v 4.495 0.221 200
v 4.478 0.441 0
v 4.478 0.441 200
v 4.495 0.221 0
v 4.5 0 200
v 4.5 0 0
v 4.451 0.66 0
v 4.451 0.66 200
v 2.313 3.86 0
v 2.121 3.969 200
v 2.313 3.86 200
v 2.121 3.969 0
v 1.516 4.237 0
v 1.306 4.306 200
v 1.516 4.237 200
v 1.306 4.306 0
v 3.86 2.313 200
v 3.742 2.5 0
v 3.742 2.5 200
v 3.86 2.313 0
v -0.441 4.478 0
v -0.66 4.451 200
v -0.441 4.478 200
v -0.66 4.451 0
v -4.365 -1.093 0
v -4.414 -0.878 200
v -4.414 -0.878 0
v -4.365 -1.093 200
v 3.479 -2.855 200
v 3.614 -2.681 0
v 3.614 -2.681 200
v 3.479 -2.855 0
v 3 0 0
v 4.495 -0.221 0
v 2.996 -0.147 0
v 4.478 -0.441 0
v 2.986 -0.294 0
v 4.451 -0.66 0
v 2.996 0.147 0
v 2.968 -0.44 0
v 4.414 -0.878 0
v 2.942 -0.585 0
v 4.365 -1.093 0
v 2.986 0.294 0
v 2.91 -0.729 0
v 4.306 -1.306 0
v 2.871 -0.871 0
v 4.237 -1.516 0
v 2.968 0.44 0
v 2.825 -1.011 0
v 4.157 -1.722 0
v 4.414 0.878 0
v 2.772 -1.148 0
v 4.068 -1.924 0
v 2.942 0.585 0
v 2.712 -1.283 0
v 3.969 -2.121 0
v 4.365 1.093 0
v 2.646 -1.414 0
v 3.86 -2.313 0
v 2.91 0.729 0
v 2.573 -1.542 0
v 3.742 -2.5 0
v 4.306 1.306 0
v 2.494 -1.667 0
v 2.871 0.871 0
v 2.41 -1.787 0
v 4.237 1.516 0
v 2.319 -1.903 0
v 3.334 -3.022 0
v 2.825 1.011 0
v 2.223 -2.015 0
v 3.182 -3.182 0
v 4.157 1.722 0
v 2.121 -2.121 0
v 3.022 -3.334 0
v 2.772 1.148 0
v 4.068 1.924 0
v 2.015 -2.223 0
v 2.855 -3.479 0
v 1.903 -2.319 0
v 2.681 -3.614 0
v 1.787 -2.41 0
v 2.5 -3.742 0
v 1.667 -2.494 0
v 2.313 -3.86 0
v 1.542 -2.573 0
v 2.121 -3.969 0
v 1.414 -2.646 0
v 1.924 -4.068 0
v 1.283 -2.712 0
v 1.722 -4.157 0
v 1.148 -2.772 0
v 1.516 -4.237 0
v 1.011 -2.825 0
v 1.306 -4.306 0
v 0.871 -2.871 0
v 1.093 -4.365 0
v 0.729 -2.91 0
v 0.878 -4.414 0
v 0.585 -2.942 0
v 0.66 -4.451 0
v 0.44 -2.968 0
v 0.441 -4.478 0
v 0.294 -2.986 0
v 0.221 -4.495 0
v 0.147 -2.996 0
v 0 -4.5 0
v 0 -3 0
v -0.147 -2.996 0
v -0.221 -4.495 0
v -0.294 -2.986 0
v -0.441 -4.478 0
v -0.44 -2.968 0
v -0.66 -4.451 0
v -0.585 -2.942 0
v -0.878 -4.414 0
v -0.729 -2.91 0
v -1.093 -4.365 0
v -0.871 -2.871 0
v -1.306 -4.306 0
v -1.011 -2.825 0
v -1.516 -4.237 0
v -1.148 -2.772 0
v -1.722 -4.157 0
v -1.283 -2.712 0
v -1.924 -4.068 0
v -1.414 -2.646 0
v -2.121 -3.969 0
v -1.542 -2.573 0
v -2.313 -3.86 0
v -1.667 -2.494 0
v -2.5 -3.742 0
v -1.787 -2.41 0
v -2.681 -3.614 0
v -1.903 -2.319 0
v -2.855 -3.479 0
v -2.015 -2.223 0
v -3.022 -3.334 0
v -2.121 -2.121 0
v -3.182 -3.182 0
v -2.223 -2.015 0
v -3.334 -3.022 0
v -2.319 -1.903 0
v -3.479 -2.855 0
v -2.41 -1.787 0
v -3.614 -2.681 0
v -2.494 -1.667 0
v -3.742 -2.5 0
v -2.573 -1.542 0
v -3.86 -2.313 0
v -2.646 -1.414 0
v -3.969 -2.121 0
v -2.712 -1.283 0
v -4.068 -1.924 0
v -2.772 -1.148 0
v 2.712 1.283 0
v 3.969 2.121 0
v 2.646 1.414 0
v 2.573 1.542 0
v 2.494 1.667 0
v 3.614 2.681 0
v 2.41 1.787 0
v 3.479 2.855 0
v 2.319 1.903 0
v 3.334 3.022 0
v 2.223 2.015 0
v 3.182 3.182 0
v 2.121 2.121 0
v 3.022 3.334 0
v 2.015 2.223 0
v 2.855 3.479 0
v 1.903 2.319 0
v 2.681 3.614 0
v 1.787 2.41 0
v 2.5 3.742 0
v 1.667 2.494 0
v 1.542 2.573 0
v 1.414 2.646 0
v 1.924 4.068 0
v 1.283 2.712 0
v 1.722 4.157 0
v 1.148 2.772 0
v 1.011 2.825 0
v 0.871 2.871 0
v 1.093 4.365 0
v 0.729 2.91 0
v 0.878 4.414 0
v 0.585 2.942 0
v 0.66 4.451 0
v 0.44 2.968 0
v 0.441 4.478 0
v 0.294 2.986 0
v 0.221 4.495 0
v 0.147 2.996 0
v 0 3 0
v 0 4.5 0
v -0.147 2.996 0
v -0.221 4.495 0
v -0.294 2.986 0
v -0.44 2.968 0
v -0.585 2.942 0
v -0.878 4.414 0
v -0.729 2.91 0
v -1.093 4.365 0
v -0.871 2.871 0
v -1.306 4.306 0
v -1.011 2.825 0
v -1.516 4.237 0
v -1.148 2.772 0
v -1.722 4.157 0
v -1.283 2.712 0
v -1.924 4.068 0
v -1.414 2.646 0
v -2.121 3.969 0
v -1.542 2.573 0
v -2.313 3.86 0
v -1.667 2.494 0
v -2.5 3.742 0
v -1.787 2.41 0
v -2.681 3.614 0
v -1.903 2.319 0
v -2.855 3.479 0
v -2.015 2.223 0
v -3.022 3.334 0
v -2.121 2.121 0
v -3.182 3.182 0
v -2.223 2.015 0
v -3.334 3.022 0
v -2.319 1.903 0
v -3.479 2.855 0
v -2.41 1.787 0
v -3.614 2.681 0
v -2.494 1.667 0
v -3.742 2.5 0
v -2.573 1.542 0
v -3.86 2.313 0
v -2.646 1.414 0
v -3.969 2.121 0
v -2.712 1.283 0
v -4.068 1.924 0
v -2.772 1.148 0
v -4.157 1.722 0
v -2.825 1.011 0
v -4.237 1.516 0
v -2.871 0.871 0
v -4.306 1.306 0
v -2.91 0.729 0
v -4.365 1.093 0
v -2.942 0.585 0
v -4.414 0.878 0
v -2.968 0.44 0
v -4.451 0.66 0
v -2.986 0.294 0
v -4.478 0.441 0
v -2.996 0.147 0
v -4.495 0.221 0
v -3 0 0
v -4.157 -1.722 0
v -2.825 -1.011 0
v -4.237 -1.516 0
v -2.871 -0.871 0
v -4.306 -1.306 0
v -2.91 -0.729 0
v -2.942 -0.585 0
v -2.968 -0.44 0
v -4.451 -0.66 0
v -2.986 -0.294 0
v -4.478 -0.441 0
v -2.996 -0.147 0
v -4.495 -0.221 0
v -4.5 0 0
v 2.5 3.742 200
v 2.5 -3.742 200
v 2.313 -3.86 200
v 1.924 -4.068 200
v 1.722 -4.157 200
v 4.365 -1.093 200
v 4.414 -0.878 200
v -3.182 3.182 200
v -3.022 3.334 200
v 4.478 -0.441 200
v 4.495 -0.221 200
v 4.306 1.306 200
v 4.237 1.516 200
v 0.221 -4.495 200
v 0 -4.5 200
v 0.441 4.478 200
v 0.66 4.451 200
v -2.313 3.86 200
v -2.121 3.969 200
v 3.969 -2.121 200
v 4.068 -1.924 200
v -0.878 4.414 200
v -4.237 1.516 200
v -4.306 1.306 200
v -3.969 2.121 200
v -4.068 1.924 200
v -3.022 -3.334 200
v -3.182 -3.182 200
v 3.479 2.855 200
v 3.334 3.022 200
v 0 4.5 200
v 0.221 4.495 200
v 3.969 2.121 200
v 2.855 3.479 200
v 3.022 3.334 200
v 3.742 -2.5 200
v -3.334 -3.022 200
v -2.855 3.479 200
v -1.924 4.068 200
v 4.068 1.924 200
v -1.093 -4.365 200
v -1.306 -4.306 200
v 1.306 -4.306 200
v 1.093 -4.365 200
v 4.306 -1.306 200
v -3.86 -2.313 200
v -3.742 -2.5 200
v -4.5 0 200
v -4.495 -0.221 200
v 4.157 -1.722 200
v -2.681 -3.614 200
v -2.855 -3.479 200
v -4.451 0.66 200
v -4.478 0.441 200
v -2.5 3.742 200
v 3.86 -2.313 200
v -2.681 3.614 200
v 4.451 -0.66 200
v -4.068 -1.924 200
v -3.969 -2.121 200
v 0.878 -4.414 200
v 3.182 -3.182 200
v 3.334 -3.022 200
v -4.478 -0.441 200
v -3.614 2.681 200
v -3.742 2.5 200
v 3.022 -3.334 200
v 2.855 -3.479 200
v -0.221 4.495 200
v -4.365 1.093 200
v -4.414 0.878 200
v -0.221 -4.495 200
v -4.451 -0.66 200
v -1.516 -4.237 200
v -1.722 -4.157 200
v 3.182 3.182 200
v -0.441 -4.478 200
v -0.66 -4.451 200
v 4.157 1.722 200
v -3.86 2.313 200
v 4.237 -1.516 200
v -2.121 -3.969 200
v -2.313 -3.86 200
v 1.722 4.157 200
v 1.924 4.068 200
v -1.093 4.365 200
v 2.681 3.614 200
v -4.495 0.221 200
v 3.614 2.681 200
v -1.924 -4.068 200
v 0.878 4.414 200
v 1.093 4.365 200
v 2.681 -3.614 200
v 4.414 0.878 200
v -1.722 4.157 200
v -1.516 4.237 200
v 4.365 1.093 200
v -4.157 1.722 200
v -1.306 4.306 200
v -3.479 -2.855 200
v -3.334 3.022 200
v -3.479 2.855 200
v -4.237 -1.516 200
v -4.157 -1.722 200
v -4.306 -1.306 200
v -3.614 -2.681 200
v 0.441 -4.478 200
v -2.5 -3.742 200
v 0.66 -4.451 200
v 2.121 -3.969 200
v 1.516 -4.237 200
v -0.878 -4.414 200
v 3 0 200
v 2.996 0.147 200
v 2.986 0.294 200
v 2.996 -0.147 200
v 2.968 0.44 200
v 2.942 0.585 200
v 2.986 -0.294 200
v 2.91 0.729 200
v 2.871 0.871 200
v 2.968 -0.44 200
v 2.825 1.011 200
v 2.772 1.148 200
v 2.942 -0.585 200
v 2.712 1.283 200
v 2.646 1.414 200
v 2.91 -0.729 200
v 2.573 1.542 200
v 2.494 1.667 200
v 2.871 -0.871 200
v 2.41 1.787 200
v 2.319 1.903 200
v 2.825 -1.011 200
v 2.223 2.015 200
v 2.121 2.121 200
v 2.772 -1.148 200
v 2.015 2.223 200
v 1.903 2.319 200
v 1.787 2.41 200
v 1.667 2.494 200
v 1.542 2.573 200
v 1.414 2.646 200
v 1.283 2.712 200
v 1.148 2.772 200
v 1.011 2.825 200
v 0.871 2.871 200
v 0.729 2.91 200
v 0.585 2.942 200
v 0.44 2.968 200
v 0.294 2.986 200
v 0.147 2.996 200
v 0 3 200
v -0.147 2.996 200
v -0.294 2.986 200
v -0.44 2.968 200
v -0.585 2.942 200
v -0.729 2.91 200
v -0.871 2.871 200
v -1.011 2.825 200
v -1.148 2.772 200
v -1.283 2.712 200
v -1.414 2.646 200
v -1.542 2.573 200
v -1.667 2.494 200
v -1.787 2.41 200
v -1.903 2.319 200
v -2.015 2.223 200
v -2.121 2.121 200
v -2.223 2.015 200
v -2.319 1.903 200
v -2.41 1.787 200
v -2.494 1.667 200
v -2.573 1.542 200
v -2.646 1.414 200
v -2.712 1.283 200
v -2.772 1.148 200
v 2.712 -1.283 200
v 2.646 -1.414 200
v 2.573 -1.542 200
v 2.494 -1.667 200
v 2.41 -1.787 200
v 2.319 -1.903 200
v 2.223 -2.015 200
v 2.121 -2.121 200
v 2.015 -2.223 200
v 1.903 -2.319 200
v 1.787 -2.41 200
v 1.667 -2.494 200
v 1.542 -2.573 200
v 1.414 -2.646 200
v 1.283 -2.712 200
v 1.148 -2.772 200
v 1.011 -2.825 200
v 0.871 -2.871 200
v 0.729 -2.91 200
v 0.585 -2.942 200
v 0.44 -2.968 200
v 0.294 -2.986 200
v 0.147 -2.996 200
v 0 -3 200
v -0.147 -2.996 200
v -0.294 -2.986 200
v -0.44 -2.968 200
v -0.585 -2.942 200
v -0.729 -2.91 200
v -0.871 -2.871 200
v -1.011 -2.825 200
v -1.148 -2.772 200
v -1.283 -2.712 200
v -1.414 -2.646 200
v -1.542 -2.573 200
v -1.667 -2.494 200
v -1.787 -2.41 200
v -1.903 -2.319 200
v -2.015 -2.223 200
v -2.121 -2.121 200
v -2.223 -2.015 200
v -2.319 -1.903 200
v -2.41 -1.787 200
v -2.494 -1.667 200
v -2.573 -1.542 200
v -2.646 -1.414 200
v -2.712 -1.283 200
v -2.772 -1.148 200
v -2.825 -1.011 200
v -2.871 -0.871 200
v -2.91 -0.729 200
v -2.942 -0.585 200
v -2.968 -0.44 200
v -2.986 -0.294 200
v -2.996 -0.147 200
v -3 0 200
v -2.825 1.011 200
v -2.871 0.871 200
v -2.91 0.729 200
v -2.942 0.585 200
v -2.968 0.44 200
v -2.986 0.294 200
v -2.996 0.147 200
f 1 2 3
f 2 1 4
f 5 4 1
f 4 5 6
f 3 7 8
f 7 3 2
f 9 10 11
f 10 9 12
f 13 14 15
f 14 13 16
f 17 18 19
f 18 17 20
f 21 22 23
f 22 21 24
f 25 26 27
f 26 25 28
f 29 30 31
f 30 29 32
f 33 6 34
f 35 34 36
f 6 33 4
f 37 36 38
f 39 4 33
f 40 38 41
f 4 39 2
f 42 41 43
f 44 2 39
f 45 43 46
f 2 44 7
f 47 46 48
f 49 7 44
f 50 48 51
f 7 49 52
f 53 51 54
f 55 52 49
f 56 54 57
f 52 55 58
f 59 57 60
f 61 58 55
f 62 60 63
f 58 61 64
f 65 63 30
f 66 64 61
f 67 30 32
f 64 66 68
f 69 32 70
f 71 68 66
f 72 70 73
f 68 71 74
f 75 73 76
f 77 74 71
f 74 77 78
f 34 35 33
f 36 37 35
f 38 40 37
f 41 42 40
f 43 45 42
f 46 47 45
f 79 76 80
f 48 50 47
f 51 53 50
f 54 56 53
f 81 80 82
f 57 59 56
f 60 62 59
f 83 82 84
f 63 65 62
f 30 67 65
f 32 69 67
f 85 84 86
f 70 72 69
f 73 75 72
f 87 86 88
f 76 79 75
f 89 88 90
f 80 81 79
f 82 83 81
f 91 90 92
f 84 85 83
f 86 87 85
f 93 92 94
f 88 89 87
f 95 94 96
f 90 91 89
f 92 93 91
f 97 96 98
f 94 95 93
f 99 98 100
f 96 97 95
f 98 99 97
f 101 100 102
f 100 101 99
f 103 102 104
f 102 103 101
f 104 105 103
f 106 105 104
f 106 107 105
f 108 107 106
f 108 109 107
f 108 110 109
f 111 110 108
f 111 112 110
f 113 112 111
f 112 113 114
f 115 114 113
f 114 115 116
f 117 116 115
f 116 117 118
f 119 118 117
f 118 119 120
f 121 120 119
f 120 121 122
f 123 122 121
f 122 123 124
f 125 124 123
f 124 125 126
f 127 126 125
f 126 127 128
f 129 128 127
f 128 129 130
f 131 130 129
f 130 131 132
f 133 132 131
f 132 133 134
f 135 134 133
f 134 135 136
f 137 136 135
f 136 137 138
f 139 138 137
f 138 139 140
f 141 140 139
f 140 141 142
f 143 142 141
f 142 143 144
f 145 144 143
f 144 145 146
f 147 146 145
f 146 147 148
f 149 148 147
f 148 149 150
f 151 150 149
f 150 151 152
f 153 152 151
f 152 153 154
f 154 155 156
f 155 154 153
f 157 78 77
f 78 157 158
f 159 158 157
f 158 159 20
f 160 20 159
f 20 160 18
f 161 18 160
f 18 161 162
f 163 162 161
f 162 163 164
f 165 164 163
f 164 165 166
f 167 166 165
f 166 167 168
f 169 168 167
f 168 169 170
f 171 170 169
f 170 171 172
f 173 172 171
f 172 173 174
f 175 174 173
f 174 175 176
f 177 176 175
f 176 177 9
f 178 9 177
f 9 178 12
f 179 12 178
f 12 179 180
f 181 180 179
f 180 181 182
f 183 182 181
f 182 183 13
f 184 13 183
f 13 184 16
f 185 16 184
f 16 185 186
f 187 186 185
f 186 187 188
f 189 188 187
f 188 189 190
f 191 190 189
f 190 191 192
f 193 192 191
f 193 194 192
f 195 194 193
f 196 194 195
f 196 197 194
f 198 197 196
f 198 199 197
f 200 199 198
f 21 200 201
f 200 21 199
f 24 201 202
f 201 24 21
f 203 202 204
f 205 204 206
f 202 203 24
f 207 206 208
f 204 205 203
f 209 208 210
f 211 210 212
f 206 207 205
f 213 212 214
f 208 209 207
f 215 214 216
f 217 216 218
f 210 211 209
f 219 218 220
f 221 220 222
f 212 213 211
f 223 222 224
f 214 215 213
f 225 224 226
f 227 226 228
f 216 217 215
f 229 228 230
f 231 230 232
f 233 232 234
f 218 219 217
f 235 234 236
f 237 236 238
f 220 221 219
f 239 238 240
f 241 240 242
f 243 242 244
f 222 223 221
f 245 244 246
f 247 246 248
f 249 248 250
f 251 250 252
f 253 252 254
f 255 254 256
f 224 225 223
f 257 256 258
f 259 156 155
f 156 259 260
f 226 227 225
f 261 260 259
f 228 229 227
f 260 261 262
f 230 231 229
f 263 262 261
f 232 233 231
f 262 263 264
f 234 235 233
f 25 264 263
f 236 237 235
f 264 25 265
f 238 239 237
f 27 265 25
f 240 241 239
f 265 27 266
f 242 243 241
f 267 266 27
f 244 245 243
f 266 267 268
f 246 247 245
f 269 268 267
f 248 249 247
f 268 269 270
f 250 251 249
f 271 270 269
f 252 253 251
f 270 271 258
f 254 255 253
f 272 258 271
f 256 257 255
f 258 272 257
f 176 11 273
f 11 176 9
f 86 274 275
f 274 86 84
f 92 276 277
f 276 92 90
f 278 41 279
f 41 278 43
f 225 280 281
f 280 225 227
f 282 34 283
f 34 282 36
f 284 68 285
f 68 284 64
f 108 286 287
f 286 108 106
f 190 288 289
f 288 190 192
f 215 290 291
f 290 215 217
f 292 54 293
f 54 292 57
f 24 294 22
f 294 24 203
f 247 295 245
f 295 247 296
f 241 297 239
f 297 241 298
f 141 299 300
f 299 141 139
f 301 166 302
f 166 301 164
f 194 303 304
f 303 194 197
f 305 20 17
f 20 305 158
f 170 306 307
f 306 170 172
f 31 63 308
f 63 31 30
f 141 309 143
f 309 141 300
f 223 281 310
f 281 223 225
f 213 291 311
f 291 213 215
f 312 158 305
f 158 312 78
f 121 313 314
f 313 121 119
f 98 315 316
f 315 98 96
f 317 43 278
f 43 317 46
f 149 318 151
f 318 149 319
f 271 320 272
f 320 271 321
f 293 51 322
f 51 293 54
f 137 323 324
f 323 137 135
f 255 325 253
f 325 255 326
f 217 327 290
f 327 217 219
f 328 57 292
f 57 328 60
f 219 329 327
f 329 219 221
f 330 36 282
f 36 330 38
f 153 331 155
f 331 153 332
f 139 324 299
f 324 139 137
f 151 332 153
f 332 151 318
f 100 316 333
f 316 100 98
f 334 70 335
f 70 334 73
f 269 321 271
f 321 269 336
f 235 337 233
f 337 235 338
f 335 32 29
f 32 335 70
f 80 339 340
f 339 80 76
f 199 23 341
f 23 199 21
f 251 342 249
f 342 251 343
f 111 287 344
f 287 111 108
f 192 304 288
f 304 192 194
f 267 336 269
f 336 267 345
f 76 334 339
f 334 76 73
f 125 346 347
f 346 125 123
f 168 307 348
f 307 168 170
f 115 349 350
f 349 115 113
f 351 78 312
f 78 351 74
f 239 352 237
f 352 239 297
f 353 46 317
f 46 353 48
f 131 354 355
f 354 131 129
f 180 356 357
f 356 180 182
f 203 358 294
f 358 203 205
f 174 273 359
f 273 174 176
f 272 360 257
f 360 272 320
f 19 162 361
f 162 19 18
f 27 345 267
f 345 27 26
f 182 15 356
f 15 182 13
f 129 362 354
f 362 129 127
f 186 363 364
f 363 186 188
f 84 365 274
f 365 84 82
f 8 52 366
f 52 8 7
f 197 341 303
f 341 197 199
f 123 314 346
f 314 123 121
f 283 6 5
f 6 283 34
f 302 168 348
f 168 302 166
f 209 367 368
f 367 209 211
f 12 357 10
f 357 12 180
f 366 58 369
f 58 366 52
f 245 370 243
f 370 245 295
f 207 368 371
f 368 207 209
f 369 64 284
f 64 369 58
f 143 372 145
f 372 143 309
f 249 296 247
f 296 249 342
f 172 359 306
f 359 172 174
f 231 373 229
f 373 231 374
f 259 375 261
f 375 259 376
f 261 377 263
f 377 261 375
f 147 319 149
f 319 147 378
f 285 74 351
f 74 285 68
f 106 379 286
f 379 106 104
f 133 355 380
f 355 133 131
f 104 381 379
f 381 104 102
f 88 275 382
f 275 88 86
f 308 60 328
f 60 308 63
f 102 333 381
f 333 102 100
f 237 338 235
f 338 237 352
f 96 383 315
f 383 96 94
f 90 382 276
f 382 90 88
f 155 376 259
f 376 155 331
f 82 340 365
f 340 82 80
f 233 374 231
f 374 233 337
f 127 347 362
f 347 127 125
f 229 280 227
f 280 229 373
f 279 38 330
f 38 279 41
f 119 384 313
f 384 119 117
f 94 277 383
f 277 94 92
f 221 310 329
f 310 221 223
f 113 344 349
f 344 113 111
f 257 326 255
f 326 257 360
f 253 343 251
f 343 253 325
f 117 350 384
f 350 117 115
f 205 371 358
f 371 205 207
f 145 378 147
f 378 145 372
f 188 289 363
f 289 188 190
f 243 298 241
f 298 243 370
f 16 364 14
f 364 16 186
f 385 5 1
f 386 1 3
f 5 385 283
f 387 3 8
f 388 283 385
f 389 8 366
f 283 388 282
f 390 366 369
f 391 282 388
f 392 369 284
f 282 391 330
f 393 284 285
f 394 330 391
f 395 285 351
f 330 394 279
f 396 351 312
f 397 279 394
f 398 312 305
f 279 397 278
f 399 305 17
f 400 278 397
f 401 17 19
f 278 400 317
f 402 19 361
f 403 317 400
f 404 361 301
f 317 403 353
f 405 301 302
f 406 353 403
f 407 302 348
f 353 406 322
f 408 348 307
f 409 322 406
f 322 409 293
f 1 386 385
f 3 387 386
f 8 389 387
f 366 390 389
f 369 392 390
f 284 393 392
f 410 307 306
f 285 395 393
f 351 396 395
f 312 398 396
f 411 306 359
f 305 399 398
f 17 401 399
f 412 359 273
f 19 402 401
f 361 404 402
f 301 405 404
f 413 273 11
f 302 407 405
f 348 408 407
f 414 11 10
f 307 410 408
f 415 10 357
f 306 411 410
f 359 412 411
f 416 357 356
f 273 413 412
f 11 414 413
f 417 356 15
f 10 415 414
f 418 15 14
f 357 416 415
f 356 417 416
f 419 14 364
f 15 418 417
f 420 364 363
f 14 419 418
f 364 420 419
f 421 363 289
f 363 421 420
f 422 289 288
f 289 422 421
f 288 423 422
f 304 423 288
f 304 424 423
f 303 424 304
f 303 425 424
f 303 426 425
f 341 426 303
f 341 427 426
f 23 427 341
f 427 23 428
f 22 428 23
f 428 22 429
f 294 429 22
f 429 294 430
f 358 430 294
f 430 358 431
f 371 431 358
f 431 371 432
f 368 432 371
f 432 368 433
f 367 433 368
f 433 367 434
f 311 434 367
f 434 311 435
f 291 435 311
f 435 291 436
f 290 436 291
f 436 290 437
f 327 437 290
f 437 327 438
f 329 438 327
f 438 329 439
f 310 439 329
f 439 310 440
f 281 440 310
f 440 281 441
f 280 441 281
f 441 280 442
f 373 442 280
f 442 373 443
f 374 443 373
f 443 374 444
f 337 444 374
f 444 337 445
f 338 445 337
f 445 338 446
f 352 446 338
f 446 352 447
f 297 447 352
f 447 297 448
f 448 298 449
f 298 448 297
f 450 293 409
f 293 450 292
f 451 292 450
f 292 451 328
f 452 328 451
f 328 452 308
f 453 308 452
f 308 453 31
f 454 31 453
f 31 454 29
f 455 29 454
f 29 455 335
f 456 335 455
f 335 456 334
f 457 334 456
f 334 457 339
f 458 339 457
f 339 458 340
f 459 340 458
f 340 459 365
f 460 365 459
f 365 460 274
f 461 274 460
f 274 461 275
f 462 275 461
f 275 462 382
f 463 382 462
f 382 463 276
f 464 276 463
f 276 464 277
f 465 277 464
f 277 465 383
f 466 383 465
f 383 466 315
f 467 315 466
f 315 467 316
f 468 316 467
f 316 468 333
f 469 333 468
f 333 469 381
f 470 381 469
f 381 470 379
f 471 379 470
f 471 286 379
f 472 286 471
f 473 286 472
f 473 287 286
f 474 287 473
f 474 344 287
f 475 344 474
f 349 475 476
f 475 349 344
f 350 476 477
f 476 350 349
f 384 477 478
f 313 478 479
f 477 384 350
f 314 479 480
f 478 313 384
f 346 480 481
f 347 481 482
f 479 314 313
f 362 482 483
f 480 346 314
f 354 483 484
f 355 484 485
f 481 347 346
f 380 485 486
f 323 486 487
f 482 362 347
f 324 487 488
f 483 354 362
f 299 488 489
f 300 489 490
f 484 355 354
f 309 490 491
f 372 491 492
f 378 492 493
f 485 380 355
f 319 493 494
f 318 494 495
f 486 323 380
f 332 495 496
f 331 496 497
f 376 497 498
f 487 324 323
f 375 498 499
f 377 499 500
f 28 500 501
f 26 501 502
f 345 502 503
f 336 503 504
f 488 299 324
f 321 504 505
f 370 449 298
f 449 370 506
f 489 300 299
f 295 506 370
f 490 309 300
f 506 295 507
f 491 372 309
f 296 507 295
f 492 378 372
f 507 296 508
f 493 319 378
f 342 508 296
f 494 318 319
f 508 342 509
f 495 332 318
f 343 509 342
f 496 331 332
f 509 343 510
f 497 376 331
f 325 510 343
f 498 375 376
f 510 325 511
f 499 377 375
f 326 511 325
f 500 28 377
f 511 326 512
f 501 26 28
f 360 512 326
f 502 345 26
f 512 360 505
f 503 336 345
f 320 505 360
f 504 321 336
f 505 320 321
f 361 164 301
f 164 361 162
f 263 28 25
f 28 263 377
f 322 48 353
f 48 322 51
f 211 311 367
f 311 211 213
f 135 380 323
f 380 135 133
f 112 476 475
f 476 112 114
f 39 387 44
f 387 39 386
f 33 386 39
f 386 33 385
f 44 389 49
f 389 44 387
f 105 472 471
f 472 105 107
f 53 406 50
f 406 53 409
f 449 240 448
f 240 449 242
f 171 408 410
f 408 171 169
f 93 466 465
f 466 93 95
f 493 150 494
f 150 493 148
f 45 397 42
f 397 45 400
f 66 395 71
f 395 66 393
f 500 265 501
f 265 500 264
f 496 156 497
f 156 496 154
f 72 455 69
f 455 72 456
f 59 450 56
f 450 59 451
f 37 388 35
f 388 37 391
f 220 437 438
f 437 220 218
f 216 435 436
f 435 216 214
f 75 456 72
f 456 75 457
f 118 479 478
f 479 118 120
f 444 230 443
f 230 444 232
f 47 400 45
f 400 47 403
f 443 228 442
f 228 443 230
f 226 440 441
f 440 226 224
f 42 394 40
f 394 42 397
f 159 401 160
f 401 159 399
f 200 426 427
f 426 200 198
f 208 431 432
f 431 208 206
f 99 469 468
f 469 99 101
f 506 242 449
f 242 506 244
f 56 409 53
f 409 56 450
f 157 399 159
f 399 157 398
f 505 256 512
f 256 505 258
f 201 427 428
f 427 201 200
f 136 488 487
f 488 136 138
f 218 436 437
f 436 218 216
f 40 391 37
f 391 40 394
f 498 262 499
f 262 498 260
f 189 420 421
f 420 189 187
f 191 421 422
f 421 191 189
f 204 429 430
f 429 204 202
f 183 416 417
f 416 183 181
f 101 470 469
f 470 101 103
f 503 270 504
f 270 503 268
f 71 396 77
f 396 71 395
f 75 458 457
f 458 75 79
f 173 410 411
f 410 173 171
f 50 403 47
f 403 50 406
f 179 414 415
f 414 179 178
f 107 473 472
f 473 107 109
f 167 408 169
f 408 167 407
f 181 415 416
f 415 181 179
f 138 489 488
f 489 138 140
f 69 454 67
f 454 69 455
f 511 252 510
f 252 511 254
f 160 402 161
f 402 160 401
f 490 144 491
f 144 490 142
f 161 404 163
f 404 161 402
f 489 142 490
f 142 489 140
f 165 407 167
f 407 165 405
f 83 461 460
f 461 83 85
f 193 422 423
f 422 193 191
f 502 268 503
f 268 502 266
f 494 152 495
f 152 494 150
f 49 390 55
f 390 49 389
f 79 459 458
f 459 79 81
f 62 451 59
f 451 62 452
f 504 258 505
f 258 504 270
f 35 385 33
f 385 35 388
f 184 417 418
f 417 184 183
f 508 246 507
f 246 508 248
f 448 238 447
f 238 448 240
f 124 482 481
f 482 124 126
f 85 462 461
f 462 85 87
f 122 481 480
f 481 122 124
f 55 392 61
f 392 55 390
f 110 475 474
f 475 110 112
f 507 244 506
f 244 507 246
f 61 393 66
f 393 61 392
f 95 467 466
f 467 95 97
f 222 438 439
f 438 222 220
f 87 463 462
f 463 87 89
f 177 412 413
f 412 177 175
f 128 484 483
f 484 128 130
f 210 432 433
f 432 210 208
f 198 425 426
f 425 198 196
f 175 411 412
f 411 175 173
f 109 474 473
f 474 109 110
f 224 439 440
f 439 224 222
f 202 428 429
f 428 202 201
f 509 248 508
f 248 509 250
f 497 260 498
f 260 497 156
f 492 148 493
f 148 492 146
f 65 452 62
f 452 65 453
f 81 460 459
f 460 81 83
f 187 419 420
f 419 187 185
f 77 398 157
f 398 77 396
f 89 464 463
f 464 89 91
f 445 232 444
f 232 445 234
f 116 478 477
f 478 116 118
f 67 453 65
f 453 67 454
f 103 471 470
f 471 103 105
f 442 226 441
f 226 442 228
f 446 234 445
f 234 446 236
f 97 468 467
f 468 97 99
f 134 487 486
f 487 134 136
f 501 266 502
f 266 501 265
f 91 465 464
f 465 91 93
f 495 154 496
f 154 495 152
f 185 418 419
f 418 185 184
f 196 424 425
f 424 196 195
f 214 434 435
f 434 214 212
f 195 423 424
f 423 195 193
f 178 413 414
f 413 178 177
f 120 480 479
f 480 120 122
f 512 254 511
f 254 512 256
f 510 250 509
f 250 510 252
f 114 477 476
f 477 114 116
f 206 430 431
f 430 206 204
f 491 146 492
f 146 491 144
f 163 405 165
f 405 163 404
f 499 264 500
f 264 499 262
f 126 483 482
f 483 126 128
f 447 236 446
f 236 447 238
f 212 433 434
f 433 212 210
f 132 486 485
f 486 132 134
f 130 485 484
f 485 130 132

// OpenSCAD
$fn = 128;

// PVC aquarium tubing (hollow flexible tube)
inner_d = 6;          // mm
wall_thickness = 1.5; // mm
outer_d = inner_d + 2*wall_thickness;

length = 200;         // mm

module tubing(len=200, od=9, id=6) {
    difference() {
        cylinder(h=len, d=od, center=false);
        translate([0,0,-0.5])
            cylinder(h=len+1, d=id, center=false);
    }
}

tubing(length, outer_d, inner_d);
